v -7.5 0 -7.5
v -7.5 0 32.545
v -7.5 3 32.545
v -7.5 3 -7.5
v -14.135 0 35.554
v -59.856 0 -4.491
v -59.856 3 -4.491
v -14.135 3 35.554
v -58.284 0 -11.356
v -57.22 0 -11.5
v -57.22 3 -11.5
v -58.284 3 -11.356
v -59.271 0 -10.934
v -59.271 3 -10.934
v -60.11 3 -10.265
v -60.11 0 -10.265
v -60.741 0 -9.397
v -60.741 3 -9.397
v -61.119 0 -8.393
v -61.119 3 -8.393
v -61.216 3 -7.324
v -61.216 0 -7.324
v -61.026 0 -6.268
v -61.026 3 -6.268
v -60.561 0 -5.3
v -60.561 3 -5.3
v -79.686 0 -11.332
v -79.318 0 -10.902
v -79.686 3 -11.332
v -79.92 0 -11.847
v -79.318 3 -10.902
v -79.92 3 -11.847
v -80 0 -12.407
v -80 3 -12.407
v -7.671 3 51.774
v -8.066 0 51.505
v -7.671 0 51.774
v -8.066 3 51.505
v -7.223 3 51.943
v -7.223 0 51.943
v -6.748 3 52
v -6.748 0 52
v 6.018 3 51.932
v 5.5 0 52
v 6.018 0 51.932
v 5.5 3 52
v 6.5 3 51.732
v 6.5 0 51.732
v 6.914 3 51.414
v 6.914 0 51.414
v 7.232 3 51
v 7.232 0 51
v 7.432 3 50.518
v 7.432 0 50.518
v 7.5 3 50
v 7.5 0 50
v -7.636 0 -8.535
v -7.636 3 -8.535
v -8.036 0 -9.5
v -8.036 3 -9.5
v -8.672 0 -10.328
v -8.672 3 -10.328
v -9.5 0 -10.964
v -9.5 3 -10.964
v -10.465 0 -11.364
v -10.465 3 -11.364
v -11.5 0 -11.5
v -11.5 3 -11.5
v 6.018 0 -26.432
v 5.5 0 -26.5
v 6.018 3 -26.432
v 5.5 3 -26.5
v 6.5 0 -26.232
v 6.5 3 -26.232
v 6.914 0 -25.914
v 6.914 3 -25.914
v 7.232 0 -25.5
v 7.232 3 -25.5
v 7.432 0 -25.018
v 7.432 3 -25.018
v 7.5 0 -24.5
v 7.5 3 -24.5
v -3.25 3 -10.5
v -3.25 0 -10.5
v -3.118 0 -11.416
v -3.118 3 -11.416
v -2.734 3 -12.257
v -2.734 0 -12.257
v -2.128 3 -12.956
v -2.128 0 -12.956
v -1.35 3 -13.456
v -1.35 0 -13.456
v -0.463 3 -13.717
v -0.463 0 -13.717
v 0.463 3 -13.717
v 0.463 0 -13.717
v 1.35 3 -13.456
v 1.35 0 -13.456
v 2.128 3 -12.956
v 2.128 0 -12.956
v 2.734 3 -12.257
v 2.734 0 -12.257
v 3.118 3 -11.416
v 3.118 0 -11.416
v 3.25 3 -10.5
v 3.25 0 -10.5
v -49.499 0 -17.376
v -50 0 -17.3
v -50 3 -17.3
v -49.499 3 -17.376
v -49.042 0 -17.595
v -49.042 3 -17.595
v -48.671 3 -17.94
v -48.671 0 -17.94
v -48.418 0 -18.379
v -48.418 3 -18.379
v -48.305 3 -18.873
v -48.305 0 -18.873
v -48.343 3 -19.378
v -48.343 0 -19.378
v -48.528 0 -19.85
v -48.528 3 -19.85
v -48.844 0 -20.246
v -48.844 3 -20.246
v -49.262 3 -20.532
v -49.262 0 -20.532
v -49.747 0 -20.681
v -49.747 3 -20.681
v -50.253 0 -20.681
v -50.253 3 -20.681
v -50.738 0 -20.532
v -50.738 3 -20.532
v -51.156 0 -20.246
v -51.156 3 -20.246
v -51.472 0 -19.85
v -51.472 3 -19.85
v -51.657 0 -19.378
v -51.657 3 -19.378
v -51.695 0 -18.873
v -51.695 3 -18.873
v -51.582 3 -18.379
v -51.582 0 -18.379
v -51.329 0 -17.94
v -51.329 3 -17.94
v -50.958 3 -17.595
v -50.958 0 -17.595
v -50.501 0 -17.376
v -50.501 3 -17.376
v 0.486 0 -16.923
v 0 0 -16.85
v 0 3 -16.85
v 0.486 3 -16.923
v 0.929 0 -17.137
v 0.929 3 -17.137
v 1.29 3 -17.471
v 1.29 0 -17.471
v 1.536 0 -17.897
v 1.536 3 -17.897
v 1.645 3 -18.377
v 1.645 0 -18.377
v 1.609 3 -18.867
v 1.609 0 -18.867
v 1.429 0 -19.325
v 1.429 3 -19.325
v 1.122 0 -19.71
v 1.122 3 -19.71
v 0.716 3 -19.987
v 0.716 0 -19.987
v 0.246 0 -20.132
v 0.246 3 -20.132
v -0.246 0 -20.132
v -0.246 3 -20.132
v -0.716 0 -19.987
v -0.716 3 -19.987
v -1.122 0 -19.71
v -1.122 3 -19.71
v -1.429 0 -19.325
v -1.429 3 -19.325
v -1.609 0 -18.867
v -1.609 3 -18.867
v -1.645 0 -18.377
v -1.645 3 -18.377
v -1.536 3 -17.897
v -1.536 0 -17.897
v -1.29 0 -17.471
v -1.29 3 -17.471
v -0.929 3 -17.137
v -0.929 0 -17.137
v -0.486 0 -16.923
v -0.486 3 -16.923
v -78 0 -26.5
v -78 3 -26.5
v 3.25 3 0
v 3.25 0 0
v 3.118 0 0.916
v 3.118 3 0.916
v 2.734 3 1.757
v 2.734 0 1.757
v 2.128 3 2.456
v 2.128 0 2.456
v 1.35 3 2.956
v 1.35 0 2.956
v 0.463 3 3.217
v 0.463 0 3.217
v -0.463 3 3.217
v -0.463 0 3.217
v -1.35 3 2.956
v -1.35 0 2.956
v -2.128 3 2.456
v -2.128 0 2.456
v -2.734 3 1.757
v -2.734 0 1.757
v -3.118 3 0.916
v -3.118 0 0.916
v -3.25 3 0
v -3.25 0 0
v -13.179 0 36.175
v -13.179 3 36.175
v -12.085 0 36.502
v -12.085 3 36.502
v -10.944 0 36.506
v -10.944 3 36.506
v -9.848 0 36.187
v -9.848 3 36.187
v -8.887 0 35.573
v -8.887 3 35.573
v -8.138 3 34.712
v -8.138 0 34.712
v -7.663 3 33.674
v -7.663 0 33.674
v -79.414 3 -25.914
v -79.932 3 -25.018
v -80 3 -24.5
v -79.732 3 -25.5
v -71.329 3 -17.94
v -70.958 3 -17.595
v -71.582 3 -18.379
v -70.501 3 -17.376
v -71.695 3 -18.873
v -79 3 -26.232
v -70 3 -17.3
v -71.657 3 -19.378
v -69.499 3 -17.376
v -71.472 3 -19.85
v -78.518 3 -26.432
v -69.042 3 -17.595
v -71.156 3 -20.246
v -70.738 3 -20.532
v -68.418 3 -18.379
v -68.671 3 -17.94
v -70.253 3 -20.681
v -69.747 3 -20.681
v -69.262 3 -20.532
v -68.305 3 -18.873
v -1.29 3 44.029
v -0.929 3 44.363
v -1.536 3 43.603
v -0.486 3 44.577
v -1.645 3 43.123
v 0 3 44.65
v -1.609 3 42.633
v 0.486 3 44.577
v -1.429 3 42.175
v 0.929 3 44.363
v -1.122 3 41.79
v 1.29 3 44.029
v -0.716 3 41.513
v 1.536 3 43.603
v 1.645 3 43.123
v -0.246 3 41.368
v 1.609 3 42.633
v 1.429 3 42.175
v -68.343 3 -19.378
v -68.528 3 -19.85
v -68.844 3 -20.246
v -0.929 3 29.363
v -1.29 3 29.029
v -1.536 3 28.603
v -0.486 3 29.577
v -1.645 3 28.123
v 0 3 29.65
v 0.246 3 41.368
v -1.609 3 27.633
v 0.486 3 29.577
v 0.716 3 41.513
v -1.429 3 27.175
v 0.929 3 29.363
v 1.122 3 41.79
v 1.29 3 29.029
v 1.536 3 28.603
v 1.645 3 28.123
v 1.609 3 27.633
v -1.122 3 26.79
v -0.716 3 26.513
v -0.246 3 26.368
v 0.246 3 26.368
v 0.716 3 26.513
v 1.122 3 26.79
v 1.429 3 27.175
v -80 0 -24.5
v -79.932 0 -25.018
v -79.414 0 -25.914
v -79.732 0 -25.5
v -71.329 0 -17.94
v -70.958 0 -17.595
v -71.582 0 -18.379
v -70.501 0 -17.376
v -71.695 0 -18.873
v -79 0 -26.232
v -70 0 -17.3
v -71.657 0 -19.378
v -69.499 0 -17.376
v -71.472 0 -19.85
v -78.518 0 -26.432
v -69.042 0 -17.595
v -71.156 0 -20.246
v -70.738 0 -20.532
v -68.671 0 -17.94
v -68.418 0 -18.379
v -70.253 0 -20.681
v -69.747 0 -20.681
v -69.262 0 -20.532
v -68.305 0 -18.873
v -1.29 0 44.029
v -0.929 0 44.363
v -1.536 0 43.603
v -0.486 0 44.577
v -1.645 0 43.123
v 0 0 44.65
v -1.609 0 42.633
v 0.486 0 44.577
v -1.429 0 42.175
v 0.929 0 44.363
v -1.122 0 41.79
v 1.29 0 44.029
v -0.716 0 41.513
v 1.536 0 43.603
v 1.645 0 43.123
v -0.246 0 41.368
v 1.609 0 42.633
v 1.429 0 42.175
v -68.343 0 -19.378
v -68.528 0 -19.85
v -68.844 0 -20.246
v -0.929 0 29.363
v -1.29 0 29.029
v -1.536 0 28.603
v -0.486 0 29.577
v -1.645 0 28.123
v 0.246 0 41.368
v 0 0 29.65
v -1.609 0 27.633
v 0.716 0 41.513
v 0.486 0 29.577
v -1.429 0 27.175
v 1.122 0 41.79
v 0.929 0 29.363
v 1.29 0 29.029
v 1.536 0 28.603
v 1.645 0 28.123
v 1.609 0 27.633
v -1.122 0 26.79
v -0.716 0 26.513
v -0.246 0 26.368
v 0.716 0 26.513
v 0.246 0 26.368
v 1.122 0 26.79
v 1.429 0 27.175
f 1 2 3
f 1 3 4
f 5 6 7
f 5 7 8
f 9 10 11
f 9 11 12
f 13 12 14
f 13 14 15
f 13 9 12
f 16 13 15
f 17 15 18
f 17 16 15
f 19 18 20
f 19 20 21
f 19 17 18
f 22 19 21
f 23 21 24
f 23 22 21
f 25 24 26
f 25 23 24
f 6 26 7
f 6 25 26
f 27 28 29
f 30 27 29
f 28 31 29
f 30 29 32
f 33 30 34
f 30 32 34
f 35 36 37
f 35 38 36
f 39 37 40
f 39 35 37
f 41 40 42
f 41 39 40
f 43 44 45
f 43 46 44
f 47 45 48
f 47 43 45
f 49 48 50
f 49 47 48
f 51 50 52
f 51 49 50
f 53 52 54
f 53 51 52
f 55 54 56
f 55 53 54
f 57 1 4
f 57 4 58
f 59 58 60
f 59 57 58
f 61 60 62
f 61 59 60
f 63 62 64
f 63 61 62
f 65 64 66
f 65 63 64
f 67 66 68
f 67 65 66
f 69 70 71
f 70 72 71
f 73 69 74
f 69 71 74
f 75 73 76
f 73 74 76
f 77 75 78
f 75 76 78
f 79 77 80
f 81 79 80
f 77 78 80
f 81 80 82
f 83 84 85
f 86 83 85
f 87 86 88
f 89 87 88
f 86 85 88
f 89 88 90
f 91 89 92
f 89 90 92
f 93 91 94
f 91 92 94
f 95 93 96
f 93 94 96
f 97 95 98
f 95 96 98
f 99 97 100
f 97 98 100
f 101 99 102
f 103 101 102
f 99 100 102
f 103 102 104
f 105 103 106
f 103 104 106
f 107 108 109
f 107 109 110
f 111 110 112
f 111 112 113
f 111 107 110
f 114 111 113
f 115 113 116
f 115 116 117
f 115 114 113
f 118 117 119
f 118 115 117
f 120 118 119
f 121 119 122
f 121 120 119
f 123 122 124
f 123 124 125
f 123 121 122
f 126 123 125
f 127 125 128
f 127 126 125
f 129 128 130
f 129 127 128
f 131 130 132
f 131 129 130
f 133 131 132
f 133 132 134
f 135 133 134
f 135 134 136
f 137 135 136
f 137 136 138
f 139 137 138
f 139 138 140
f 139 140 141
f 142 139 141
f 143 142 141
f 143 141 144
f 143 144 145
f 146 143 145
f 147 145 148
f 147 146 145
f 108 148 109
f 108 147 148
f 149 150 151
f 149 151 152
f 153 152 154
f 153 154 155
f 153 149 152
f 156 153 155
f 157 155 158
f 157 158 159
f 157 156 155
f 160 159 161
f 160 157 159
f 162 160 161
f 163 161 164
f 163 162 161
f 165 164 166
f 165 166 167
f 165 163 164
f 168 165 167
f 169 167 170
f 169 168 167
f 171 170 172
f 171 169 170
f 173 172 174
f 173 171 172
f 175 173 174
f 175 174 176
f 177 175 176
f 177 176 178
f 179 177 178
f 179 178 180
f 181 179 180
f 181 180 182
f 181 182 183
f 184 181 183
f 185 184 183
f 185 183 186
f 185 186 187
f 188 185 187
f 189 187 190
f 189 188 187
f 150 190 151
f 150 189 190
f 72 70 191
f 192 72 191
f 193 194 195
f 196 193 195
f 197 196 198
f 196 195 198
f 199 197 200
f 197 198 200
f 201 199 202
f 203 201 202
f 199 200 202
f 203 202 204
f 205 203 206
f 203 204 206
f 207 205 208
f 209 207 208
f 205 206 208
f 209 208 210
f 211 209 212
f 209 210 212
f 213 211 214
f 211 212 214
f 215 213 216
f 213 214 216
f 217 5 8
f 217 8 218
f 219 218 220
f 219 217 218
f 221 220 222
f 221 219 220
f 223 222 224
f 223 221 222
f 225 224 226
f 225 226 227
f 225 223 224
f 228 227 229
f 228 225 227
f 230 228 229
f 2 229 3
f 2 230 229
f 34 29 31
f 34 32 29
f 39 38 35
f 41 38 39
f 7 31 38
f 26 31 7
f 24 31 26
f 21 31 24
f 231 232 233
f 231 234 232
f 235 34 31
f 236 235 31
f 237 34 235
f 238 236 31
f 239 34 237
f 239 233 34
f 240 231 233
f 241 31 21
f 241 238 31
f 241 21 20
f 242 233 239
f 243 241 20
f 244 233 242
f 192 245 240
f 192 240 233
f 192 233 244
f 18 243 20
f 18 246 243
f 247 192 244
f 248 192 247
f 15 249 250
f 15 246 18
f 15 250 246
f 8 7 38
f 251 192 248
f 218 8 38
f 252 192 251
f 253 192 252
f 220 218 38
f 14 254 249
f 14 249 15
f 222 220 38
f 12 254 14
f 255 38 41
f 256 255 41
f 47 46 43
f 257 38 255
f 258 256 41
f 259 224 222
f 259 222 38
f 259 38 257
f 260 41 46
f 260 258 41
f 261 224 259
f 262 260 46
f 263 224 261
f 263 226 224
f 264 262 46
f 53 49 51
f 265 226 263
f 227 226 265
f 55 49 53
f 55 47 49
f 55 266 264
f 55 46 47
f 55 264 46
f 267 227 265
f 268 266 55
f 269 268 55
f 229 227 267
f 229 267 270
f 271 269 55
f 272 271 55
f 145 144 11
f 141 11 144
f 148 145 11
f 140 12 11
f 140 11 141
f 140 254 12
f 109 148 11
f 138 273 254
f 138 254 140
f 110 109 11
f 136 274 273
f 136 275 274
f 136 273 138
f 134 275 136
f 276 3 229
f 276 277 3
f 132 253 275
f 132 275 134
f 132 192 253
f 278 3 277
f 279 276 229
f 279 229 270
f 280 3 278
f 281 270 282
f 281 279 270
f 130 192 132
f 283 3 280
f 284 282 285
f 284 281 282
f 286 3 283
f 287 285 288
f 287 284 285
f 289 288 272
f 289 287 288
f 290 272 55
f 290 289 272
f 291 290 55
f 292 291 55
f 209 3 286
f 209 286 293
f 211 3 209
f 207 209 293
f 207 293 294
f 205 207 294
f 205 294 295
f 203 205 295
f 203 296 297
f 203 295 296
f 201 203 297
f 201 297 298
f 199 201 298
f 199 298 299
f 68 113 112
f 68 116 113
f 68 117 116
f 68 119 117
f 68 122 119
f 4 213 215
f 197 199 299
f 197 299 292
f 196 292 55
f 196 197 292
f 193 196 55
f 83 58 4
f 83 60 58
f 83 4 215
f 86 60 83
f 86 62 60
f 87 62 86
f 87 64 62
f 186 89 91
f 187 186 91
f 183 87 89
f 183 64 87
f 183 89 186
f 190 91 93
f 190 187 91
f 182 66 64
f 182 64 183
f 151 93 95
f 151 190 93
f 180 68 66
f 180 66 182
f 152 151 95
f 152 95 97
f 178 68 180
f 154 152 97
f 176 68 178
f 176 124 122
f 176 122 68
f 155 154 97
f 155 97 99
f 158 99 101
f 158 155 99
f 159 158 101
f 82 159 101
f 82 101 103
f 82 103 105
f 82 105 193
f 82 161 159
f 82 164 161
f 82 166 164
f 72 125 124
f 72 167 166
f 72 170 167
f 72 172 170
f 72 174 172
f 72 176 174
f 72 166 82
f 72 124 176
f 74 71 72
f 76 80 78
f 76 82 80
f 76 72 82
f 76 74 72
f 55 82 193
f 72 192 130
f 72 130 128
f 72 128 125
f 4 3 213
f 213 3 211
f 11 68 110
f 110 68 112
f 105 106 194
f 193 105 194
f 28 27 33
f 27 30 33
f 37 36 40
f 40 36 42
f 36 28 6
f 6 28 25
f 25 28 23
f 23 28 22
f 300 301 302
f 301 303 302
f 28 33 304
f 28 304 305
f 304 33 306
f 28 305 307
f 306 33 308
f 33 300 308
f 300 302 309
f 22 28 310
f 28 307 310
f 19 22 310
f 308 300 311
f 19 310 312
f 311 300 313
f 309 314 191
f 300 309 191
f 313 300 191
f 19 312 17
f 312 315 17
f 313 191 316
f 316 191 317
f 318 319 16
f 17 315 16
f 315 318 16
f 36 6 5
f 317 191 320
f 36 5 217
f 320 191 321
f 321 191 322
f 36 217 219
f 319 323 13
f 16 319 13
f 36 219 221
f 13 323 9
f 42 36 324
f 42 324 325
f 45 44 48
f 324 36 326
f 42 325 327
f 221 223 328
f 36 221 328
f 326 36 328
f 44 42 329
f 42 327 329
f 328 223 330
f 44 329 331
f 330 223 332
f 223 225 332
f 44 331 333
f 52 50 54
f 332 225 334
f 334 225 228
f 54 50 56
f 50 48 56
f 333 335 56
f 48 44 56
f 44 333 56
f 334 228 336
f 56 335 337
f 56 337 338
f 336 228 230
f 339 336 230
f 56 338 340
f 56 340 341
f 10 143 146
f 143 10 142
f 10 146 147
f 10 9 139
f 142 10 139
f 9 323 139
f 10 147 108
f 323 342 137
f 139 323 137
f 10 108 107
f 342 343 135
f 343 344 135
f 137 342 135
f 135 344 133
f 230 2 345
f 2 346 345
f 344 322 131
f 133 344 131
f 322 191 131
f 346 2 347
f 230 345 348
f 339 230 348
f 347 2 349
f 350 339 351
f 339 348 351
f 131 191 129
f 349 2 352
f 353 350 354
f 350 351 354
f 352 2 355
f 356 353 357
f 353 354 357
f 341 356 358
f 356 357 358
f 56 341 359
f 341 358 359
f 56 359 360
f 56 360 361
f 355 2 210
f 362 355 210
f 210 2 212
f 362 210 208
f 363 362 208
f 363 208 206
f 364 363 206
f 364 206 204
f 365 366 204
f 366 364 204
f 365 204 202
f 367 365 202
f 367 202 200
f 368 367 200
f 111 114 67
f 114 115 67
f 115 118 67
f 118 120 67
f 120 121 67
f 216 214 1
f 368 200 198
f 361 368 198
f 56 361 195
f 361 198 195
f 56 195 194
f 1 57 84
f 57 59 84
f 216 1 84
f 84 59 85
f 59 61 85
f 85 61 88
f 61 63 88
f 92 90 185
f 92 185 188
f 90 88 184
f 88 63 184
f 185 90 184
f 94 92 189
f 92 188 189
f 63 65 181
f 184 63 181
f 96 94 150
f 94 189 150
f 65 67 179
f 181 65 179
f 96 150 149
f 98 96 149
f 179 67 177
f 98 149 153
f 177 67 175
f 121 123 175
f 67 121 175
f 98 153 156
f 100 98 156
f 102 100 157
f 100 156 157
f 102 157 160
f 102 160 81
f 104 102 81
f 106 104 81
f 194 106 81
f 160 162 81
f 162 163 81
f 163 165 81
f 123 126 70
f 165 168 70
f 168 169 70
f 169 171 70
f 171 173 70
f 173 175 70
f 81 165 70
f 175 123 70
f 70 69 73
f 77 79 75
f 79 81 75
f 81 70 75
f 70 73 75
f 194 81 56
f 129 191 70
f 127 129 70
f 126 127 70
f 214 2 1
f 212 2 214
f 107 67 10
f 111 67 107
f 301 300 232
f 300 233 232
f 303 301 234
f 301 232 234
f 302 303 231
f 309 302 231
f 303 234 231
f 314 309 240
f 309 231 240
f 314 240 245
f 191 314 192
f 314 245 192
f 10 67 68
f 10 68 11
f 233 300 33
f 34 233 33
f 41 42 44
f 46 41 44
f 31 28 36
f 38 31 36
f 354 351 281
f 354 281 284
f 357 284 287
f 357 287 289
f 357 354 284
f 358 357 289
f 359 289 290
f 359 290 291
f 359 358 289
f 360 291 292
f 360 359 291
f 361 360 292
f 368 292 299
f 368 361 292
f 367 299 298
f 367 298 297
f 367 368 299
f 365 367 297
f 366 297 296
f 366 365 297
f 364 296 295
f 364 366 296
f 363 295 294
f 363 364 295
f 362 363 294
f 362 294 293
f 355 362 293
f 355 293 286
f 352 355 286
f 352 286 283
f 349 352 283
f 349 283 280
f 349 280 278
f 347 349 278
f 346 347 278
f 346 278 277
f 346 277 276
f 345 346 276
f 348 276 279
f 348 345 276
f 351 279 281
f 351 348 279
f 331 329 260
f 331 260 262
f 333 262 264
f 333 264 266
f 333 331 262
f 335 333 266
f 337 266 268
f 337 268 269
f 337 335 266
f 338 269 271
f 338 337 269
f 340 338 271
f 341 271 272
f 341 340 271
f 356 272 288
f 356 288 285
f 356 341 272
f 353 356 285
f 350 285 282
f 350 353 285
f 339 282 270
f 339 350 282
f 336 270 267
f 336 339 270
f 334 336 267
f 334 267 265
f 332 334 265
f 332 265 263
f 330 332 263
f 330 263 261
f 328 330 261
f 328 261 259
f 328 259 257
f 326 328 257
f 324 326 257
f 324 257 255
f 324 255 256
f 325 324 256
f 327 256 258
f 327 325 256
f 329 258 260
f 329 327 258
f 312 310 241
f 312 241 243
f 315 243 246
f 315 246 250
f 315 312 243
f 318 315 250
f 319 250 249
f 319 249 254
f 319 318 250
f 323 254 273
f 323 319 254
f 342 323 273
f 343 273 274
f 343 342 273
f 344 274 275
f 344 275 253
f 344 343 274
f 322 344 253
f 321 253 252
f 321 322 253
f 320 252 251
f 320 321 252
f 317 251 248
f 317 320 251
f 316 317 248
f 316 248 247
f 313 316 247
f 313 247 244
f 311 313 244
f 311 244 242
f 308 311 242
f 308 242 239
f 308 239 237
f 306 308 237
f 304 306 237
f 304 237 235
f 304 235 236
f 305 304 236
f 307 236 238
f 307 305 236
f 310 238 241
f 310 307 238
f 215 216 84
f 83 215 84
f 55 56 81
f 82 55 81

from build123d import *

# Parameters (mm, degrees)
SKETCH_1_R      = 1.65
SKETCH_1_R_2    = 1.7
EXTRUDE_1_DEPTH = 3
FILLET_1_R      = 2


with BuildPart() as part:
    # 草图1 → 凸台-拉伸1 (new body)
    with BuildSketch(Plane(origin=(0, 0, 0), x_dir=(1, 0, 0), z_dir=(0, 1, 0))):
        Polygon((-80, 11.5), (-7.5, -52), (7.5, -52), (7.5, 26.5), (-7.5, 26.5), (-80, 26.5), align=None)
        with Locations(Location((0, 18.5, 0), (0, 0, 270))):
            Circle(SKETCH_1_R, mode=Mode.SUBTRACT)
        with Locations(Location((0, -28, 0), (0, 0, 270))):
            Circle(SKETCH_1_R, mode=Mode.SUBTRACT)
        with Locations(Location((0, -43, 0), (0, 0, 270))):
            Circle(SKETCH_1_R, mode=Mode.SUBTRACT)
        with Locations(Location((-70, 19, 0), (0, 0, 270))):
            Circle(SKETCH_1_R_2, mode=Mode.SUBTRACT)
        with Locations(Location((-50, 19, 0), (0, 0, 270))):
            Circle(SKETCH_1_R_2, mode=Mode.SUBTRACT)
        with BuildLine():
            Line((-3.25, 0), (-3.25, 10.5))
            ThreePointArc((-3.25, 10.5), (0, 13.75), (3.25, 10.5))
            Line((3.25, 10.5), (3.25, 0))
            ThreePointArc((3.25, 0), (0, -3.25), (-3.25, 0))
        make_face(mode=Mode.SUBTRACT)
        with BuildLine():
            Line((-7.5, -32.544518989), (-7.5, 7.5))
            ThreePointArc((-7.5, 7.5), (-8.671572875, 10.328427125), (-11.5, 11.5))
            Line((-11.5, 11.5), (-57.220120105, 11.5))
            ThreePointArc((-57.220120105, 11.5), (-60.964187654, 8.907820368), (-59.855607382, 4.490979094))
            Line((-59.855607382, 4.490979094), (-14.135487277, -35.553539895))
            ThreePointArc((-14.135487277, -35.553539895), (-9.848023775, -36.18745387), (-7.5, -32.544518989))
        make_face(mode=Mode.SUBTRACT)
    extrude(amount=EXTRUDE_1_DEPTH)

    # 圆角1
    fillet_1_edges = [part.edges().sort_by_distance(p)[0] for p in [
        (7.5, 1.5, 52),
        (-7.5, 1.5, 52),
        (-80, 1.5, -11.5),
        (-80, 1.5, -26.5),
        (7.5, 1.5, -26.5),
    ]]
    fillet(fillet_1_edges, radius=FILLET_1_R)


solid = part.part
